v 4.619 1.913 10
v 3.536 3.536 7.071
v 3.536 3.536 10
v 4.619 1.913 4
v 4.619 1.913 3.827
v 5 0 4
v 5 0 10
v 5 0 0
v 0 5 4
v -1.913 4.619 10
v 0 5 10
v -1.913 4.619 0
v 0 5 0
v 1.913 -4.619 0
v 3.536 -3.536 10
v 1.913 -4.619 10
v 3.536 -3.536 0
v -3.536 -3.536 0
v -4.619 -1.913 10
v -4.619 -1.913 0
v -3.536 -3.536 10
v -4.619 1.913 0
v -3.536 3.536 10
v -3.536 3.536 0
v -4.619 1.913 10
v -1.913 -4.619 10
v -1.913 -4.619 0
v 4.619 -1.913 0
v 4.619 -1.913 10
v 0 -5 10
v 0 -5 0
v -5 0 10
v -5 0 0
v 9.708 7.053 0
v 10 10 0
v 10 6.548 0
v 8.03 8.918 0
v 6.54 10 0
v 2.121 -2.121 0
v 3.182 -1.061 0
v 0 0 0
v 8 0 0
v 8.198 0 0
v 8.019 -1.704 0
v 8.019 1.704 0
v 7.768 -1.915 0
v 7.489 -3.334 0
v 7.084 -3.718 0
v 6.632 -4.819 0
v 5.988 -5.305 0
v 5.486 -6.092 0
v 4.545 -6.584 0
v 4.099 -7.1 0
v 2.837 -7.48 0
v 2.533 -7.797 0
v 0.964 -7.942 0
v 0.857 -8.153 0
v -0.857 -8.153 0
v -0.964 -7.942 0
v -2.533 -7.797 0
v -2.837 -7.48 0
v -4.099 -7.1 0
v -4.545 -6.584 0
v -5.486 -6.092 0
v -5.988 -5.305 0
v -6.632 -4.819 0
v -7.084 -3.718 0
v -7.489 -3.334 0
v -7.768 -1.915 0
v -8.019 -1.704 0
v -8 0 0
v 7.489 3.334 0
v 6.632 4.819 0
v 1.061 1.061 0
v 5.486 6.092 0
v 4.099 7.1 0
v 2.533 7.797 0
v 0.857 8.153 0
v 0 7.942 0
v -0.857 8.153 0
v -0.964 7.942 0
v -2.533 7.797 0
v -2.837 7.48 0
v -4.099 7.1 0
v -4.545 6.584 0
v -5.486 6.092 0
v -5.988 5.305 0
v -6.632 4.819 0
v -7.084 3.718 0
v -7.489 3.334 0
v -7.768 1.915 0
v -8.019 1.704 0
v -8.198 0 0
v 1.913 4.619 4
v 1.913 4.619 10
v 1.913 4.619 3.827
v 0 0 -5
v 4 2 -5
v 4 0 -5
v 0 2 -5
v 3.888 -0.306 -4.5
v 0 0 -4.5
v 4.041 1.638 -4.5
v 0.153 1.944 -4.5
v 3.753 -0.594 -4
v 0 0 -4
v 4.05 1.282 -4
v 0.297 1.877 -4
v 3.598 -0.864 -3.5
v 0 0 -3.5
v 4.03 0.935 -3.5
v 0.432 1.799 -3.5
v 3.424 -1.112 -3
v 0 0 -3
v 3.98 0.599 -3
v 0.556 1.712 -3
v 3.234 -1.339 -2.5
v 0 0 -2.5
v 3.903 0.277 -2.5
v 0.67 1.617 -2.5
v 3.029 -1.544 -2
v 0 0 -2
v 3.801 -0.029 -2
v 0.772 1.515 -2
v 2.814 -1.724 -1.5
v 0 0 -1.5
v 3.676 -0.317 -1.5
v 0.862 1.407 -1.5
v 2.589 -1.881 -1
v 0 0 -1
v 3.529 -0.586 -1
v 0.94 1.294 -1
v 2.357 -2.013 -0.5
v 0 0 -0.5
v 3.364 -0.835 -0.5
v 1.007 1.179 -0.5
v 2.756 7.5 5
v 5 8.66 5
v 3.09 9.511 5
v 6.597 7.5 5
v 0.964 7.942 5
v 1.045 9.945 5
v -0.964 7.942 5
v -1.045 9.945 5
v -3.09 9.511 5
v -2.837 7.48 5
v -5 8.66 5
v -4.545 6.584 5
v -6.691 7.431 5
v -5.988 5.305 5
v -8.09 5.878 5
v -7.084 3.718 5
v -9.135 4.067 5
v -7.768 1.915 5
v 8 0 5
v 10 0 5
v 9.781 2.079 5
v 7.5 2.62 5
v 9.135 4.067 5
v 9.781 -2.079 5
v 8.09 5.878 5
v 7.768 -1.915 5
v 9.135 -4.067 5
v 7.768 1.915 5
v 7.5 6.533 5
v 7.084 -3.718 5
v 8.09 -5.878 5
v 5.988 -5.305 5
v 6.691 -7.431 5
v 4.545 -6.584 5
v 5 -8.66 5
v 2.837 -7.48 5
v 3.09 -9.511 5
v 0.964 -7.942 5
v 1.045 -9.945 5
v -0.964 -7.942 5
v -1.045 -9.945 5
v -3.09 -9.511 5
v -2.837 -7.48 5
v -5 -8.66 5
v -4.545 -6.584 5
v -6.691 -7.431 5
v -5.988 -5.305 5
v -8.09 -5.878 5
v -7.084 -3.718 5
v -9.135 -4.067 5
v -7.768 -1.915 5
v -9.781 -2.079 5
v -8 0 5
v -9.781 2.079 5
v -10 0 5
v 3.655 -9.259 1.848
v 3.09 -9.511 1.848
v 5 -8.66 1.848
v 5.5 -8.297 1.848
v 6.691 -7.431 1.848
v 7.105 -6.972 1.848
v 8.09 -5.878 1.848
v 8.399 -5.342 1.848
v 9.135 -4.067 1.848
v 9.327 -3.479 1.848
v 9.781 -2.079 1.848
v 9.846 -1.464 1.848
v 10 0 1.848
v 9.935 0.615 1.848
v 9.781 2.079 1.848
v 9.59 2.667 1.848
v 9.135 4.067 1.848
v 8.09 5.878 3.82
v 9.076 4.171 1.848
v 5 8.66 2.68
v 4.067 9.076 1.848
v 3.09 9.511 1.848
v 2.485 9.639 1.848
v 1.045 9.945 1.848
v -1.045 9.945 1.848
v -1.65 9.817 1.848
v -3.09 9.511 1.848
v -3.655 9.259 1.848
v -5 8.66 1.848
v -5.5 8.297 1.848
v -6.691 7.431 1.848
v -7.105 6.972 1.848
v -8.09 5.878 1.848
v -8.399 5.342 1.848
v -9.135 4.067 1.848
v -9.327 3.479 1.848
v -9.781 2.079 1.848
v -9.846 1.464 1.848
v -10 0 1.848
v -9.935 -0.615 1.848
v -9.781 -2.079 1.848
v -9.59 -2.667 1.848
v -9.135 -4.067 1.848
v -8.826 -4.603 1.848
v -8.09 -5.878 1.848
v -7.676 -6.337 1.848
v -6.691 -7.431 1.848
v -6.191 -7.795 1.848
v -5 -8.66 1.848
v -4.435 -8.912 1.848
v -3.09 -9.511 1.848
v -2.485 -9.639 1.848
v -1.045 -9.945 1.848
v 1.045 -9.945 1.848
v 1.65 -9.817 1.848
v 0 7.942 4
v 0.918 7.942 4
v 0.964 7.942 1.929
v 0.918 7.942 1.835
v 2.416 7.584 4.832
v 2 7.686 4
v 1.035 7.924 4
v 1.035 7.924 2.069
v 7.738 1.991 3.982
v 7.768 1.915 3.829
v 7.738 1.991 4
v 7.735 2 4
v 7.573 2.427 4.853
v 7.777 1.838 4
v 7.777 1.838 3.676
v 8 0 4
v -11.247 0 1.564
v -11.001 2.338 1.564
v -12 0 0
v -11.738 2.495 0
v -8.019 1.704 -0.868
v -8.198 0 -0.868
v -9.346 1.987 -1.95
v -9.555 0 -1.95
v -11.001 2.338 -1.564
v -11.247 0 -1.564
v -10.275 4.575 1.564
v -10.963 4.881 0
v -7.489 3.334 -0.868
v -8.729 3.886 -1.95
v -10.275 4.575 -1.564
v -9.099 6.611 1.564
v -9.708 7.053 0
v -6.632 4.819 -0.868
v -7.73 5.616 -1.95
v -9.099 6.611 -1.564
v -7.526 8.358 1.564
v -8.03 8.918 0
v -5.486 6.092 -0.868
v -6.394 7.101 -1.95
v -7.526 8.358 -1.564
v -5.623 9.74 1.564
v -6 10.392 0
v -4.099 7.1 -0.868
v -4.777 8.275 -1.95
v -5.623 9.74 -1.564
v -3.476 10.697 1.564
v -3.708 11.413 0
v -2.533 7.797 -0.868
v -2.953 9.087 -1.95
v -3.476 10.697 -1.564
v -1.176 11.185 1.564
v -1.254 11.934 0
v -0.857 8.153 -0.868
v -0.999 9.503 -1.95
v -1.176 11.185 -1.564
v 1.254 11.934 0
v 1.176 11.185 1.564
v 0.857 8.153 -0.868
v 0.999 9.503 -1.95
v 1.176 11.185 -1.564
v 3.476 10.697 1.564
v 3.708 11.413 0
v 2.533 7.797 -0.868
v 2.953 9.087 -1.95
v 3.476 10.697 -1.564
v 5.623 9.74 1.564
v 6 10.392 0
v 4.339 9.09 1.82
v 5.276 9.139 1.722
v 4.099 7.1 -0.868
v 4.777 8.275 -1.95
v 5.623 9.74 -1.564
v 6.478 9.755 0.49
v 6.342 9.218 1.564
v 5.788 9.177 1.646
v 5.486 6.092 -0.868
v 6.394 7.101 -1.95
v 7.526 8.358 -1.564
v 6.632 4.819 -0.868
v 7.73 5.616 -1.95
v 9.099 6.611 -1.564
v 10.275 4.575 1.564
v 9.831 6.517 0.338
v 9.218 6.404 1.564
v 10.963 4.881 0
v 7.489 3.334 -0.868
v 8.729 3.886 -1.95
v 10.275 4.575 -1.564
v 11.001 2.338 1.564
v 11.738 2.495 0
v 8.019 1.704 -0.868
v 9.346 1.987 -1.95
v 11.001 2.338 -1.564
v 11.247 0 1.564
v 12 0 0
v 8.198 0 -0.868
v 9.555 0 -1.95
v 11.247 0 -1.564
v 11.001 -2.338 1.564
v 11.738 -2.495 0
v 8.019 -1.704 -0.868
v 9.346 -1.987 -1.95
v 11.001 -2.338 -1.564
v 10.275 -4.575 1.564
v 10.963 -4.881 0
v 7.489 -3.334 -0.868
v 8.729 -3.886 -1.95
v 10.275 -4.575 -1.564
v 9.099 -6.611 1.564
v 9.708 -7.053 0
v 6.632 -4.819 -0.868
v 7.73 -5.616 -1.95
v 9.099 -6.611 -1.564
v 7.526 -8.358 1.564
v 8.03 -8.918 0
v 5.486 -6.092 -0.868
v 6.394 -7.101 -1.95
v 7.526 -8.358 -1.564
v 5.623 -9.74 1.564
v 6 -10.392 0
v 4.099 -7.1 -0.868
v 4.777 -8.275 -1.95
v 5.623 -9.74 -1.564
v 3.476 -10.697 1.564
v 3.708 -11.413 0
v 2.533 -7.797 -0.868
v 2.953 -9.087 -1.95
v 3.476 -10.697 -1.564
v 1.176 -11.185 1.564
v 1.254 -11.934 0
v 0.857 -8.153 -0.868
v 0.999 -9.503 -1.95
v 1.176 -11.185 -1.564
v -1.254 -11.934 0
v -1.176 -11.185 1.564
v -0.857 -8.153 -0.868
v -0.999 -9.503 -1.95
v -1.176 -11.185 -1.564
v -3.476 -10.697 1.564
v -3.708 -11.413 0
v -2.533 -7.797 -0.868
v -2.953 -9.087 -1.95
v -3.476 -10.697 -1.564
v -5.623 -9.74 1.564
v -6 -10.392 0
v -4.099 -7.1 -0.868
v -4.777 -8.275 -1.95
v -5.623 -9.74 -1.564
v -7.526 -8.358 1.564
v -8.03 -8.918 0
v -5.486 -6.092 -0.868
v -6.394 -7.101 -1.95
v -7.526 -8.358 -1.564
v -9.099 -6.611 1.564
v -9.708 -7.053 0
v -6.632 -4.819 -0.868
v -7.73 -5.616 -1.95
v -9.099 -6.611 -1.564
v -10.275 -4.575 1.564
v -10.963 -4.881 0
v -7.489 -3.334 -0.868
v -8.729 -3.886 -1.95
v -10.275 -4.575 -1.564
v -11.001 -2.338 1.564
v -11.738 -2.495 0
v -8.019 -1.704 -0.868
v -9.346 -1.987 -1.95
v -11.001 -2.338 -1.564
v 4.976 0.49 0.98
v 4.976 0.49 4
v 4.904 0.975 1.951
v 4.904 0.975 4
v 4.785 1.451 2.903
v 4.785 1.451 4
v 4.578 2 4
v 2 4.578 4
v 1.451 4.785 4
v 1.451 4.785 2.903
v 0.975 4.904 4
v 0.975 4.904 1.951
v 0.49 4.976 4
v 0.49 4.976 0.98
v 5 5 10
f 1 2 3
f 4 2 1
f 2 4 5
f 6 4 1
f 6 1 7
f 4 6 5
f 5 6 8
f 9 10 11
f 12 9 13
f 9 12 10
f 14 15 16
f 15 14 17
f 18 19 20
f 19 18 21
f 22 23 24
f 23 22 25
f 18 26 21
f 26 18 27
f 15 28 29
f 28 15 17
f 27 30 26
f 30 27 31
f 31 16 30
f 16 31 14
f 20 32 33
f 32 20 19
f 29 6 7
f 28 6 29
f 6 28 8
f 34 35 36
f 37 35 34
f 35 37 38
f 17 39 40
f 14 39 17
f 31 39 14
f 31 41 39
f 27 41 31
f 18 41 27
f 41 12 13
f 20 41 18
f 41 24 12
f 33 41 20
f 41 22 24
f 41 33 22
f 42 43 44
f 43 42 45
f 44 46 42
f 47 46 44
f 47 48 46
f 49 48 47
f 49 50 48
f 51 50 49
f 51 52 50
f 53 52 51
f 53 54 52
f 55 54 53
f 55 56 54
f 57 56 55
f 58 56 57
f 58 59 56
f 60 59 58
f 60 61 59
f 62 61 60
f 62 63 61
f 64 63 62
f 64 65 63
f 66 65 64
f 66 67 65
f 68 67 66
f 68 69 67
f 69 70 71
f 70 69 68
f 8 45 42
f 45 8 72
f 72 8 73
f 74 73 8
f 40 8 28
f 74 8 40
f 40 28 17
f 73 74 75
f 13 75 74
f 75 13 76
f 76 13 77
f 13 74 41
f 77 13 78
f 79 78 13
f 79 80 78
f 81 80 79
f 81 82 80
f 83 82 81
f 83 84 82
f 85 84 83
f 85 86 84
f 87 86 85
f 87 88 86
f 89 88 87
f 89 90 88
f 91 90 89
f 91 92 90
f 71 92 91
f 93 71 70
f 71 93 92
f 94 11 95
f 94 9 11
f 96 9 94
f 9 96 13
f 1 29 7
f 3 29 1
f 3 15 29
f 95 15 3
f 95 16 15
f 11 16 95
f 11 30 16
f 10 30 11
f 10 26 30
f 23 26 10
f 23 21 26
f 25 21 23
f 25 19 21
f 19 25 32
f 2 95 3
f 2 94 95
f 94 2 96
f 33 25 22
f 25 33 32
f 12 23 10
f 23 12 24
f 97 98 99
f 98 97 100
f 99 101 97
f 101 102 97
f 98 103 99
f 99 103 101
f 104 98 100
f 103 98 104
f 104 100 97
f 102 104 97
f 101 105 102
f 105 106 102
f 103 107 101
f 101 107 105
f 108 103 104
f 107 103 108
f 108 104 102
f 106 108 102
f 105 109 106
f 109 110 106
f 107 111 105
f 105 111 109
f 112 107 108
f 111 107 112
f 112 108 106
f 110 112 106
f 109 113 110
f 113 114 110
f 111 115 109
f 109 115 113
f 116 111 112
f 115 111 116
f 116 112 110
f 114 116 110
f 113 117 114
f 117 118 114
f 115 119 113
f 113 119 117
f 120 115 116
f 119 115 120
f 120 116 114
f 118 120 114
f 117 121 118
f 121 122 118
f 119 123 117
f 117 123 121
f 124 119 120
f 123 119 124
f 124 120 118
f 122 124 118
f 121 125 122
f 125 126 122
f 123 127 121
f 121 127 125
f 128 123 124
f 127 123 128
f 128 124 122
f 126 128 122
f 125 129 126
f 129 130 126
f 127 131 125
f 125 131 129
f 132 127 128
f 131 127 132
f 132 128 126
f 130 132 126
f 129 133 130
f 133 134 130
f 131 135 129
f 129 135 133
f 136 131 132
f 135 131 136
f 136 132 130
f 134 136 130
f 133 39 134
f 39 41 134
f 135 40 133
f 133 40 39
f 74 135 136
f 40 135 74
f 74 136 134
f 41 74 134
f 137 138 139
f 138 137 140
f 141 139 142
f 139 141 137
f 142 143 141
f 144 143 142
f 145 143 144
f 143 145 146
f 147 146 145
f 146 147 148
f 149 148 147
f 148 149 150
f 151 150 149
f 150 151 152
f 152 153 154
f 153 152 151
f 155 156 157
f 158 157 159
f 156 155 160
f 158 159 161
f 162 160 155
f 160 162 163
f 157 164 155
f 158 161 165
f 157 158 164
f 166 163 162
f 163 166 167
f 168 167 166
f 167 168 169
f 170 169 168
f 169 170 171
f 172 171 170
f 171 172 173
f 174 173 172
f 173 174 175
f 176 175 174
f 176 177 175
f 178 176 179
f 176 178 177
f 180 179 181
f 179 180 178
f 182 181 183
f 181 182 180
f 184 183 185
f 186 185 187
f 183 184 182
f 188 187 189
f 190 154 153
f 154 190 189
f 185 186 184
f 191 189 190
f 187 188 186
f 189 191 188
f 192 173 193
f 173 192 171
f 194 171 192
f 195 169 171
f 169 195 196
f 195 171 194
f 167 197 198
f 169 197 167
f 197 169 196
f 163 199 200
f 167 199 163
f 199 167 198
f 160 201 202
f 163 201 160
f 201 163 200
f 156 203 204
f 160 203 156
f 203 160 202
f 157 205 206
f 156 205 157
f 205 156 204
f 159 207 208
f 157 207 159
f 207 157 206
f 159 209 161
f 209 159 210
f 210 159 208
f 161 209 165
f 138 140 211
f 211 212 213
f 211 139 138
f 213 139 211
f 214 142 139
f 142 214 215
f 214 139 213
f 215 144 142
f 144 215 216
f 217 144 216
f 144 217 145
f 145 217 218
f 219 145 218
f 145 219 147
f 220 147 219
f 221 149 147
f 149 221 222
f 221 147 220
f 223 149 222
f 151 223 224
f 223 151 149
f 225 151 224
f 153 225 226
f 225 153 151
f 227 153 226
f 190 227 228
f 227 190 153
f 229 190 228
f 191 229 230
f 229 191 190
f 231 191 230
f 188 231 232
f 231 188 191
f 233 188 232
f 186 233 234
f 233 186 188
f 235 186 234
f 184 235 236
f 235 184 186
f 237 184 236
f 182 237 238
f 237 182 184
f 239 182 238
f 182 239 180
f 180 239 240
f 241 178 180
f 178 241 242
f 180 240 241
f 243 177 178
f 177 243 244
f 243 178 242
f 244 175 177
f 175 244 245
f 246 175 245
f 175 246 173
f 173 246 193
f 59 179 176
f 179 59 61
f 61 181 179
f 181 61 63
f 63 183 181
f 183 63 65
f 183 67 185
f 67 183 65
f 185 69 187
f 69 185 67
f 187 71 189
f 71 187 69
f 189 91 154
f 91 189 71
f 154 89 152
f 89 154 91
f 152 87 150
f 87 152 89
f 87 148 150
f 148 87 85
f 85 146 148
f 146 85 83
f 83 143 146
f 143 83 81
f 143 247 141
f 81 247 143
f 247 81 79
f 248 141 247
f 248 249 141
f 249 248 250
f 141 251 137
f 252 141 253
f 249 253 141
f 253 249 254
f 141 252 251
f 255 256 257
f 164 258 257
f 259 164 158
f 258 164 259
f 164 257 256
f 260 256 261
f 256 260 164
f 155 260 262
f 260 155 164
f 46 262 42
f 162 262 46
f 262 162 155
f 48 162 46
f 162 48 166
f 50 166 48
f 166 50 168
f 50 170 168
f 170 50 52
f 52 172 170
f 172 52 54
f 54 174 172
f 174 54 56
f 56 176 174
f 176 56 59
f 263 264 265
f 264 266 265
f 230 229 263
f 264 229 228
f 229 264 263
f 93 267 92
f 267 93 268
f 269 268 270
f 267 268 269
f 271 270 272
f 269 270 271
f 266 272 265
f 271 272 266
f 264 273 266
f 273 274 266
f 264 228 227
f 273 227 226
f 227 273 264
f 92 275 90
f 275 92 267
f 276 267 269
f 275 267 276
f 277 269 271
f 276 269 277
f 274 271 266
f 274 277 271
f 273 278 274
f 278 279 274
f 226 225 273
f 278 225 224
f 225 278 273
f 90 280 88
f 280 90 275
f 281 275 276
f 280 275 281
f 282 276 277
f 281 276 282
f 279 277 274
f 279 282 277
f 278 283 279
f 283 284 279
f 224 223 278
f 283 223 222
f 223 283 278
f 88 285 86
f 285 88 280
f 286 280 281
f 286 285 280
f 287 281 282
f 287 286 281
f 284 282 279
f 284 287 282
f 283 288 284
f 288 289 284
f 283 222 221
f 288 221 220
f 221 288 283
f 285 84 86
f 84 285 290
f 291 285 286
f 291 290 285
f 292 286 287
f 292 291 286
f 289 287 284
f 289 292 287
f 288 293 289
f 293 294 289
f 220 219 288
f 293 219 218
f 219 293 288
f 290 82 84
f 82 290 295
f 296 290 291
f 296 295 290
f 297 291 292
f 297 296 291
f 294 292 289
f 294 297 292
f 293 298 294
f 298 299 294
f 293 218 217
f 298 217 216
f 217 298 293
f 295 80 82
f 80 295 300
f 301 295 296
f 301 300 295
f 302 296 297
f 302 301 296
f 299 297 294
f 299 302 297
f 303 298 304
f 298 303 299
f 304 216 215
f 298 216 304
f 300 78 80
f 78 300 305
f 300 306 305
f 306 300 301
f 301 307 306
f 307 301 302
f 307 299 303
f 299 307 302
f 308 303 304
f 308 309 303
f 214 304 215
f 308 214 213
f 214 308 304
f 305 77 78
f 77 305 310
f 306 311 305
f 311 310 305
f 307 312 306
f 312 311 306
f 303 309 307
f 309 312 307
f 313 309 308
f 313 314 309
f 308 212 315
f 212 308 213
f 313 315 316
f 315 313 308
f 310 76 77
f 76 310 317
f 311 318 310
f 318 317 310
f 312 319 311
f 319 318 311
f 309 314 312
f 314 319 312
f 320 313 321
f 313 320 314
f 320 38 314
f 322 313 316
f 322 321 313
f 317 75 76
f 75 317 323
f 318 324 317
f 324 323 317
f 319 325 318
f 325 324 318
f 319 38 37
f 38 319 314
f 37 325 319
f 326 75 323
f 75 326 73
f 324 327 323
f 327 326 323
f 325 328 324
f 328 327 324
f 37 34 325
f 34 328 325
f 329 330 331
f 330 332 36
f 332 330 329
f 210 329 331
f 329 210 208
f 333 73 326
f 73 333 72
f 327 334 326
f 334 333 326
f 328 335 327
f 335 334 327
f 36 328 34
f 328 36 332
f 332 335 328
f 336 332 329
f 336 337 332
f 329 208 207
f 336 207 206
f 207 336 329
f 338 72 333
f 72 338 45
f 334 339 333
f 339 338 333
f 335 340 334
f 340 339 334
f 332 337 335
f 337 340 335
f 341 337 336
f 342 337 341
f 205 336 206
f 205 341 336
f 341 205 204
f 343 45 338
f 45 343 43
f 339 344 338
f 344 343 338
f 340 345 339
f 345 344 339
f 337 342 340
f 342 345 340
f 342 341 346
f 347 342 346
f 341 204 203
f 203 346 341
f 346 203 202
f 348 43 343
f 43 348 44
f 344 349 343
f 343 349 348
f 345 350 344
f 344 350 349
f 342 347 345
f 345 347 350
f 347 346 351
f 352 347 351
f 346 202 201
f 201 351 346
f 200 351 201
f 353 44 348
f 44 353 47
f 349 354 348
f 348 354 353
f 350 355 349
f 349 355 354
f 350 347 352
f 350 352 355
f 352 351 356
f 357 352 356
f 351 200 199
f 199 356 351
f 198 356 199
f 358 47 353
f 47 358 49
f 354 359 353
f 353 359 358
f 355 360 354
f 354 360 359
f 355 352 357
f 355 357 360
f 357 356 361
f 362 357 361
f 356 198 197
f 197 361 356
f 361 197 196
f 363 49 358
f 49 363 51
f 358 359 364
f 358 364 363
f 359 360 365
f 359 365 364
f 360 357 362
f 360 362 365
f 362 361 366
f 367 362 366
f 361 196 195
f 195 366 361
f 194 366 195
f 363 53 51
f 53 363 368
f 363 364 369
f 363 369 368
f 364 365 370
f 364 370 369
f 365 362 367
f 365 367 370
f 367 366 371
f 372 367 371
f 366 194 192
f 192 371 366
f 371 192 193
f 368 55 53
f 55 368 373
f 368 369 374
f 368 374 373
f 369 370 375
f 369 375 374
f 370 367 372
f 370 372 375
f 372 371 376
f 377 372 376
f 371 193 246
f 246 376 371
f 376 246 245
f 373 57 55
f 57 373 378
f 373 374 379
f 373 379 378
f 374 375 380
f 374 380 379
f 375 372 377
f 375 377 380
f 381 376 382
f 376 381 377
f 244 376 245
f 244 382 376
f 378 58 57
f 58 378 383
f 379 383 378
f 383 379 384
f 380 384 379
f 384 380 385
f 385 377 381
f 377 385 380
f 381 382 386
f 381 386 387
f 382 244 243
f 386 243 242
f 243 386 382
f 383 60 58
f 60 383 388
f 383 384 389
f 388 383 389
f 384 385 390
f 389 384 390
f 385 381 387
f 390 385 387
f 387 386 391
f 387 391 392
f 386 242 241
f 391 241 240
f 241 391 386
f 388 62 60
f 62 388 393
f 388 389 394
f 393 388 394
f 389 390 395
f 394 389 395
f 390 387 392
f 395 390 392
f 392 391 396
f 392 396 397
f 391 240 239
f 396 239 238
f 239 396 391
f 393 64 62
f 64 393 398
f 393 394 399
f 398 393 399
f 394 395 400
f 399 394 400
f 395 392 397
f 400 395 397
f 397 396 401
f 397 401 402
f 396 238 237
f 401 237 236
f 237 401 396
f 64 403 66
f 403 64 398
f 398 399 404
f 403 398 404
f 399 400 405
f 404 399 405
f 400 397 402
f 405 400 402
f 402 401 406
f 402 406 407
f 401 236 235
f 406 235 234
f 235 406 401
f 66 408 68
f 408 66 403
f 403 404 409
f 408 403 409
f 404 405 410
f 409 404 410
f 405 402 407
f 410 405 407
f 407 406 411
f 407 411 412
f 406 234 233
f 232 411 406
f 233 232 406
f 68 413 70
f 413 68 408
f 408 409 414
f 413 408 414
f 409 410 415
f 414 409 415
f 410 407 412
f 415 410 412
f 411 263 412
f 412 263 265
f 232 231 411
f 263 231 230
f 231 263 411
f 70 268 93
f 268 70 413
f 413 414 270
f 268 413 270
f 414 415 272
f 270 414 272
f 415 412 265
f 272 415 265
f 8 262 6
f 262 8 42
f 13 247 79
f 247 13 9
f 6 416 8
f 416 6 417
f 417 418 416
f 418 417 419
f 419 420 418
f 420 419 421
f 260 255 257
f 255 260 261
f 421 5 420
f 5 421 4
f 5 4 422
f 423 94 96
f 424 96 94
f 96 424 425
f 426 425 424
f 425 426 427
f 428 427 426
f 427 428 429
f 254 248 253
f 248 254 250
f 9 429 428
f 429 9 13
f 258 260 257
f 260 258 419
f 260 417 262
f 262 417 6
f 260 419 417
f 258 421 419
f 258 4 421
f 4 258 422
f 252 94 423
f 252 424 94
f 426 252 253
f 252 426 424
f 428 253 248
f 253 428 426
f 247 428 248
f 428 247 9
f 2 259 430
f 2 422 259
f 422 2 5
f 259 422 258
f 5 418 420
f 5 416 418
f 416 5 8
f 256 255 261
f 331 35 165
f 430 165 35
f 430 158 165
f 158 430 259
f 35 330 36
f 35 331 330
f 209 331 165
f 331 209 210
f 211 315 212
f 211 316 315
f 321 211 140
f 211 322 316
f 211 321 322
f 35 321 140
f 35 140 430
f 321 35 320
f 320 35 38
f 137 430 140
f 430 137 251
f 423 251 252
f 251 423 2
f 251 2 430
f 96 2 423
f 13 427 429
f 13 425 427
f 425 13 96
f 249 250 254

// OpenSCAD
// 2D profiles and extrusions.
linear_extrude(height = 10) circle(5);
linear_extrude(height = 10, center = true, twist = 90, slices = 20, scale = 0.5) square([4, 2]);
linear_extrude(5) {
    difference() {
        circle(10);
        circle(8);
    }
}

rotate_extrude() translate([10, 0]) circle(2);
rotate_extrude(angle = 90, $fn = 64) polygon([[5, 0], [8, 0], [8, 4], [5, 4]]);

offset(r = 1) square(10);
offset(delta = -0.5) circle(5);

projection(cut = true) translate([0, 0, -1]) cube(4, center = true);

text("rscad", size = 8, font = "Liberation Sans");

polyhedron(
    points = [[0, 0, 0], [10, 0, 0], [10, 10, 0], [0, 10, 0], [5, 5, 10]],
    faces = [[0, 1, 4], [1, 2, 4], [2, 3, 4], [3, 0, 4], [3, 2, 1, 0]]
);
